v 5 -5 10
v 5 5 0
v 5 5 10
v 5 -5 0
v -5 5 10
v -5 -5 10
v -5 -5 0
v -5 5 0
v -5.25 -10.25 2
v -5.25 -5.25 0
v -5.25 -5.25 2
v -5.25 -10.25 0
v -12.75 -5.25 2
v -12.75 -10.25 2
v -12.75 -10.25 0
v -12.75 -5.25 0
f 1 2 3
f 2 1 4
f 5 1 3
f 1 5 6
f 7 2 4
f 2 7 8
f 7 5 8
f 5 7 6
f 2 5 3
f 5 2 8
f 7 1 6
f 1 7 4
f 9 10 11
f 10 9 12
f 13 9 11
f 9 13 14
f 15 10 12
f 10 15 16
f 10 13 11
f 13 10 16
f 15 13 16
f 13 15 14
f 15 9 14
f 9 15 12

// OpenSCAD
translate([0, 0, 5]) color([0,1,0,0.9]) cube([10, 10, 10], center=true);
translate([-5.5, -5.5, 1]) color([1,0,0]) cube([0.5, 0.5, 2], center=true);
translate([-6.0, -5.5, 1]) color([1,0,0]) cube([0.5, 0.5, 2], center=true);
translate([-6.5, -5.5, 1]) color([1,0,0]) cube([0.5, 0.5, 2], center=true);
translate([-7.0, -5.5, 1]) color([1,0,0]) cube([0.5, 0.5, 2], center=true);
translate([-7.5, -5.5, 1]) color([1,0,0]) cube([0.5, 0.5, 2], center=true);
translate([-8.0, -5.5, 1]) color([1,0,0]) cube([0.5, 0.5, 2], center=true);
translate([-8.5, -5.5, 1]) color([1,0,0]) cube([0.5, 0.5, 2], center=true);
translate([-9.0, -5.5, 1]) color([1,0,0]) cube([0.5, 0.5, 2], center=true);
translate([-9.5, -5.5, 1]) color([1,0,0]) cube([0.5, 0.5, 2], center=true);
translate([-10.0, -5.5, 1]) color([1,0,0]) cube([0.5, 0.5, 2], center=true);
translate([-10.5, -5.5, 1]) color([1,0,0]) cube([0.5, 0.5, 2], center=true);
translate([-11.0, -5.5, 1]) color([1,0,0]) cube([0.5, 0.5, 2], center=true);
translate([-11.5, -5.5, 1]) color([1,0,0]) cube([0.5, 0.5, 2], center=true);
translate([-12.0, -5.5, 1]) color([1,0,0]) cube([0.5, 0.5, 2], center=true);
translate([-12.5, -5.5, 1]) color([1,0,0]) cube([0.5, 0.5, 2], center=true);
translate([-5.5, -6.0, 1]) color([1,0,0]) cube([0.5, 0.5, 2], center=true);
translate([-6.0, -6.0, 1]) color([1,0,0]) cube([0.5, 0.5, 2], center=true);
translate([-6.5, -6.0, 1]) color([1,0,0]) cube([0.5, 0.5, 2], center=true);
translate([-7.0, -6.0, 1]) color([1,0,0]) cube([0.5, 0.5, 2], center=true);
translate([-7.5, -6.0, 1]) color([1,0,0]) cube([0.5, 0.5, 2], center=true);
translate([-8.0, -6.0, 1]) color([1,0,0]) cube([0.5, 0.5, 2], center=true);
translate([-8.5, -6.0, 1]) color([1,0,0]) cube([0.5, 0.5, 2], center=true);
translate([-9.0, -6.0, 1]) color([1,0,0]) cube([0.5, 0.5, 2], center=true);
translate([-9.5, -6.0, 1]) color([1,0,0]) cube([0.5, 0.5, 2], center=true);
translate([-10.0, -6.0, 1]) color([1,0,0]) cube([0.5, 0.5, 2], center=true);
translate([-10.5, -6.0, 1]) color([1,0,0]) cube([0.5, 0.5, 2], center=true);
translate([-11.0, -6.0, 1]) color([1,0,0]) cube([0.5, 0.5, 2], center=true);
translate([-11.5, -6.0, 1]) color([1,0,0]) cube([0.5, 0.5, 2], center=true);
translate([-12.0, -6.0, 1]) color([1,0,0]) cube([0.5, 0.5, 2], center=true);
translate([-12.5, -6.0, 1]) color([1,0,0]) cube([0.5, 0.5, 2], center=true);
translate([-5.5, -6.5, 1]) color([1,0,0]) cube([0.5, 0.5, 2], center=true);
translate([-6.0, -6.5, 1]) color([1,0,0]) cube([0.5, 0.5, 2], center=true);
translate([-6.5, -6.5, 1]) color([1,0,0]) cube([0.5, 0.5, 2], center=true);
translate([-7.0, -6.5, 1]) color([1,0,0]) cube([0.5, 0.5, 2], center=true);
translate([-7.5, -6.5, 1]) color([1,0,0]) cube([0.5, 0.5, 2], center=true);
translate([-8.0, -6.5, 1]) color([1,0,0]) cube([0.5, 0.5, 2], center=true);
translate([-8.5, -6.5, 1]) color([1,0,0]) cube([0.5, 0.5, 2], center=true);
translate([-9.0, -6.5, 1]) color([1,0,0]) cube([0.5, 0.5, 2], center=true);
translate([-9.5, -6.5, 1]) color([1,0,0]) cube([0.5, 0.5, 2], center=true);
translate([-10.0, -6.5, 1]) color([1,0,0]) cube([0.5, 0.5, 2], center=true);
translate([-10.5, -6.5, 1]) color([1,0,0]) cube([0.5, 0.5, 2], center=true);
translate([-11.0, -6.5, 1]) color([1,0,0]) cube([0.5, 0.5, 2], center=true);
translate([-11.5, -6.5, 1]) color([1,0,0]) cube([0.5, 0.5, 2], center=true);
translate([-12.0, -6.5, 1]) color([1,0,0]) cube([0.5, 0.5, 2], center=true);
translate([-12.5, -6.5, 1]) color([1,0,0]) cube([0.5, 0.5, 2], center=true);
translate([-5.5, -7.0, 1]) color([1,0,0]) cube([0.5, 0.5, 2], center=true);
translate([-6.0, -7.0, 1]) color([1,0,0]) cube([0.5, 0.5, 2], center=true);
translate([-6.5, -7.0, 1]) color([1,0,0]) cube([0.5, 0.5, 2], center=true);
translate([-7.0, -7.0, 1]) color([1,0,0]) cube([0.5, 0.5, 2], center=true);
translate([-7.5, -7.0, 1]) color([1,0,0]) cube([0.5, 0.5, 2], center=true);
translate([-8.0, -7.0, 1]) color([1,0,0]) cube([0.5, 0.5, 2], center=true);
translate([-8.5, -7.0, 1]) color([1,0,0]) cube([0.5, 0.5, 2], center=true);
translate([-9.0, -7.0, 1]) color([1,0,0]) cube([0.5, 0.5, 2], center=true);
translate([-9.5, -7.0, 1]) color([1,0,0]) cube([0.5, 0.5, 2], center=true);
translate([-10.0, -7.0, 1]) color([1,0,0]) cube([0.5, 0.5, 2], center=true);
translate([-10.5, -7.0, 1]) color([1,0,0]) cube([0.5, 0.5, 2], center=true);
translate([-11.0, -7.0, 1]) color([1,0,0]) cube([0.5, 0.5, 2], center=true);
translate([-11.5, -7.0, 1]) color([1,0,0]) cube([0.5, 0.5, 2], center=true);
translate([-12.0, -7.0, 1]) color([1,0,0]) cube([0.5, 0.5, 2], center=true);
translate([-12.5, -7.0, 1]) color([1,0,0]) cube([0.5, 0.5, 2], center=true);
translate([-5.5, -7.5, 1]) color([1,0,0]) cube([0.5, 0.5, 2], center=true);
translate([-6.0, -7.5, 1]) color([1,0,0]) cube([0.5, 0.5, 2], center=true);
translate([-6.5, -7.5, 1]) color([1,0,0]) cube([0.5, 0.5, 2], center=true);
translate([-7.0, -7.5, 1]) color([1,0,0]) cube([0.5, 0.5, 2], center=true);
translate([-7.5, -7.5, 1]) color([1,0,0]) cube([0.5, 0.5, 2], center=true);
translate([-8.0, -7.5, 1]) color([1,0,0]) cube([0.5, 0.5, 2], center=true);
translate([-8.5, -7.5, 1]) color([1,0,0]) cube([0.5, 0.5, 2], center=true);
translate([-9.0, -7.5, 1]) color([1,0,0]) cube([0.5, 0.5, 2], center=true);
translate([-9.5, -7.5, 1]) color([1,0,0]) cube([0.5, 0.5, 2], center=true);
translate([-10.0, -7.5, 1]) color([1,0,0]) cube([0.5, 0.5, 2], center=true);
translate([-10.5, -7.5, 1]) color([1,0,0]) cube([0.5, 0.5, 2], center=true);
translate([-11.0, -7.5, 1]) color([1,0,0]) cube([0.5, 0.5, 2], center=true);
translate([-11.5, -7.5, 1]) color([1,0,0]) cube([0.5, 0.5, 2], center=true);
translate([-12.0, -7.5, 1]) color([1,0,0]) cube([0.5, 0.5, 2], center=true);
translate([-12.5, -7.5, 1]) color([1,0,0]) cube([0.5, 0.5, 2], center=true);
translate([-5.5, -8.0, 1]) color([1,0,0]) cube([0.5, 0.5, 2], center=true);
translate([-6.0, -8.0, 1]) color([1,0,0]) cube([0.5, 0.5, 2], center=true);
translate([-6.5, -8.0, 1]) color([1,0,0]) cube([0.5, 0.5, 2], center=true);
translate([-7.0, -8.0, 1]) color([1,0,0]) cube([0.5, 0.5, 2], center=true);
translate([-7.5, -8.0, 1]) color([1,0,0]) cube([0.5, 0.5, 2], center=true);
translate([-8.0, -8.0, 1]) color([1,0,0]) cube([0.5, 0.5, 2], center=true);
translate([-8.5, -8.0, 1]) color([1,0,0]) cube([0.5, 0.5, 2], center=true);
translate([-9.0, -8.0, 1]) color([1,0,0]) cube([0.5, 0.5, 2], center=true);
translate([-9.5, -8.0, 1]) color([1,0,0]) cube([0.5, 0.5, 2], center=true);
translate([-10.0, -8.0, 1]) color([1,0,0]) cube([0.5, 0.5, 2], center=true);
translate([-10.5, -8.0, 1]) color([1,0,0]) cube([0.5, 0.5, 2], center=true);
translate([-11.0, -8.0, 1]) color([1,0,0]) cube([0.5, 0.5, 2], center=true);
translate([-11.5, -8.0, 1]) color([1,0,0]) cube([0.5, 0.5, 2], center=true);
translate([-12.0, -8.0, 1]) color([1,0,0]) cube([0.5, 0.5, 2], center=true);
translate([-12.5, -8.0, 1]) color([1,0,0]) cube([0.5, 0.5, 2], center=true);
translate([-5.5, -8.5, 1]) color([1,0,0]) cube([0.5, 0.5, 2], center=true);
translate([-6.0, -8.5, 1]) color([1,0,0]) cube([0.5, 0.5, 2], center=true);
translate([-6.5, -8.5, 1]) color([1,0,0]) cube([0.5, 0.5, 2], center=true);
translate([-7.0, -8.5, 1]) color([1,0,0]) cube([0.5, 0.5, 2], center=true);
translate([-7.5, -8.5, 1]) color([1,0,0]) cube([0.5, 0.5, 2], center=true);
translate([-8.0, -8.5, 1]) color([1,0,0]) cube([0.5, 0.5, 2], center=true);
translate([-8.5, -8.5, 1]) color([1,0,0]) cube([0.5, 0.5, 2], center=true);
translate([-9.0, -8.5, 1]) color([1,0,0]) cube([0.5, 0.5, 2], center=true);
translate([-9.5, -8.5, 1]) color([1,0,0]) cube([0.5, 0.5, 2], center=true);
translate([-10.0, -8.5, 1]) color([1,0,0]) cube([0.5, 0.5, 2], center=true);
translate([-10.5, -8.5, 1]) color([1,0,0]) cube([0.5, 0.5, 2], center=true);
translate([-11.0, -8.5, 1]) color([1,0,0]) cube([0.5, 0.5, 2], center=true);
translate([-11.5, -8.5, 1]) color([1,0,0]) cube([0.5, 0.5, 2], center=true);
translate([-12.0, -8.5, 1]) color([1,0,0]) cube([0.5, 0.5, 2], center=true);
translate([-12.5, -8.5, 1]) color([1,0,0]) cube([0.5, 0.5, 2], center=true);
translate([-5.5, -9.0, 1]) color([1,0,0]) cube([0.5, 0.5, 2], center=true);
translate([-6.0, -9.0, 1]) color([1,0,0]) cube([0.5, 0.5, 2], center=true);
translate([-6.5, -9.0, 1]) color([1,0,0]) cube([0.5, 0.5, 2], center=true);
translate([-7.0, -9.0, 1]) color([1,0,0]) cube([0.5, 0.5, 2], center=true);
translate([-7.5, -9.0, 1]) color([1,0,0]) cube([0.5, 0.5, 2], center=true);
translate([-8.0, -9.0, 1]) color([1,0,0]) cube([0.5, 0.5, 2], center=true);
translate([-8.5, -9.0, 1]) color([1,0,0]) cube([0.5, 0.5, 2], center=true);
translate([-9.0, -9.0, 1]) color([1,0,0]) cube([0.5, 0.5, 2], center=true);
translate([-9.5, -9.0, 1]) color([1,0,0]) cube([0.5, 0.5, 2], center=true);
translate([-10.0, -9.0, 1]) color([1,0,0]) cube([0.5, 0.5, 2], center=true);
translate([-10.5, -9.0, 1]) color([1,0,0]) cube([0.5, 0.5, 2], center=true);
translate([-11.0, -9.0, 1]) color([1,0,0]) cube([0.5, 0.5, 2], center=true);
translate([-11.5, -9.0, 1]) color([1,0,0]) cube([0.5, 0.5, 2], center=true);
translate([-12.0, -9.0, 1]) color([1,0,0]) cube([0.5, 0.5, 2], center=true);
translate([-12.5, -9.0, 1]) color([1,0,0]) cube([0.5, 0.5, 2], center=true);
translate([-5.5, -9.5, 1]) color([1,0,0]) cube([0.5, 0.5, 2], center=true);
translate([-6.0, -9.5, 1]) color([1,0,0]) cube([0.5, 0.5, 2], center=true);
translate([-6.5, -9.5, 1]) color([1,0,0]) cube([0.5, 0.5, 2], center=true);
translate([-7.0, -9.5, 1]) color([1,0,0]) cube([0.5, 0.5, 2], center=true);
translate([-7.5, -9.5, 1]) color([1,0,0]) cube([0.5, 0.5, 2], center=true);
translate([-8.0, -9.5, 1]) color([1,0,0]) cube([0.5, 0.5, 2], center=true);
translate([-8.5, -9.5, 1]) color([1,0,0]) cube([0.5, 0.5, 2], center=true);
translate([-9.0, -9.5, 1]) color([1,0,0]) cube([0.5, 0.5, 2], center=true);
translate([-9.5, -9.5, 1]) color([1,0,0]) cube([0.5, 0.5, 2], center=true);
translate([-10.0, -9.5, 1]) color([1,0,0]) cube([0.5, 0.5, 2], center=true);
translate([-10.5, -9.5, 1]) color([1,0,0]) cube([0.5, 0.5, 2], center=true);
translate([-11.0, -9.5, 1]) color([1,0,0]) cube([0.5, 0.5, 2], center=true);
translate([-11.5, -9.5, 1]) color([1,0,0]) cube([0.5, 0.5, 2], center=true);
translate([-12.0, -9.5, 1]) color([1,0,0]) cube([0.5, 0.5, 2], center=true);
translate([-12.5, -9.5, 1]) color([1,0,0]) cube([0.5, 0.5, 2], center=true);
translate([-5.5, -10.0, 1]) color([1,0,0]) cube([0.5, 0.5, 2], center=true);
translate([-6.0, -10.0, 1]) color([1,0,0]) cube([0.5, 0.5, 2], center=true);
translate([-6.5, -10.0, 1]) color([1,0,0]) cube([0.5, 0.5, 2], center=true);
translate([-7.0, -10.0, 1]) color([1,0,0]) cube([0.5, 0.5, 2], center=true);
translate([-7.5, -10.0, 1]) color([1,0,0]) cube([0.5, 0.5, 2], center=true);
translate([-8.0, -10.0, 1]) color([1,0,0]) cube([0.5, 0.5, 2], center=true);
translate([-8.5, -10.0, 1]) color([1,0,0]) cube([0.5, 0.5, 2], center=true);
translate([-9.0, -10.0, 1]) color([1,0,0]) cube([0.5, 0.5, 2], center=true);
translate([-9.5, -10.0, 1]) color([1,0,0]) cube([0.5, 0.5, 2], center=true);
translate([-10.0, -10.0, 1]) color([1,0,0]) cube([0.5, 0.5, 2], center=true);
translate([-10.5, -10.0, 1]) color([1,0,0]) cube([0.5, 0.5, 2], center=true);
translate([-11.0, -10.0, 1]) color([1,0,0]) cube([0.5, 0.5, 2], center=true);
translate([-11.5, -10.0, 1]) color([1,0,0]) cube([0.5, 0.5, 2], center=true);
translate([-12.0, -10.0, 1]) color([1,0,0]) cube([0.5, 0.5, 2], center=true);
translate([-12.5, -10.0, 1]) color([1,0,0]) cube([0.5, 0.5, 2], center=true);
